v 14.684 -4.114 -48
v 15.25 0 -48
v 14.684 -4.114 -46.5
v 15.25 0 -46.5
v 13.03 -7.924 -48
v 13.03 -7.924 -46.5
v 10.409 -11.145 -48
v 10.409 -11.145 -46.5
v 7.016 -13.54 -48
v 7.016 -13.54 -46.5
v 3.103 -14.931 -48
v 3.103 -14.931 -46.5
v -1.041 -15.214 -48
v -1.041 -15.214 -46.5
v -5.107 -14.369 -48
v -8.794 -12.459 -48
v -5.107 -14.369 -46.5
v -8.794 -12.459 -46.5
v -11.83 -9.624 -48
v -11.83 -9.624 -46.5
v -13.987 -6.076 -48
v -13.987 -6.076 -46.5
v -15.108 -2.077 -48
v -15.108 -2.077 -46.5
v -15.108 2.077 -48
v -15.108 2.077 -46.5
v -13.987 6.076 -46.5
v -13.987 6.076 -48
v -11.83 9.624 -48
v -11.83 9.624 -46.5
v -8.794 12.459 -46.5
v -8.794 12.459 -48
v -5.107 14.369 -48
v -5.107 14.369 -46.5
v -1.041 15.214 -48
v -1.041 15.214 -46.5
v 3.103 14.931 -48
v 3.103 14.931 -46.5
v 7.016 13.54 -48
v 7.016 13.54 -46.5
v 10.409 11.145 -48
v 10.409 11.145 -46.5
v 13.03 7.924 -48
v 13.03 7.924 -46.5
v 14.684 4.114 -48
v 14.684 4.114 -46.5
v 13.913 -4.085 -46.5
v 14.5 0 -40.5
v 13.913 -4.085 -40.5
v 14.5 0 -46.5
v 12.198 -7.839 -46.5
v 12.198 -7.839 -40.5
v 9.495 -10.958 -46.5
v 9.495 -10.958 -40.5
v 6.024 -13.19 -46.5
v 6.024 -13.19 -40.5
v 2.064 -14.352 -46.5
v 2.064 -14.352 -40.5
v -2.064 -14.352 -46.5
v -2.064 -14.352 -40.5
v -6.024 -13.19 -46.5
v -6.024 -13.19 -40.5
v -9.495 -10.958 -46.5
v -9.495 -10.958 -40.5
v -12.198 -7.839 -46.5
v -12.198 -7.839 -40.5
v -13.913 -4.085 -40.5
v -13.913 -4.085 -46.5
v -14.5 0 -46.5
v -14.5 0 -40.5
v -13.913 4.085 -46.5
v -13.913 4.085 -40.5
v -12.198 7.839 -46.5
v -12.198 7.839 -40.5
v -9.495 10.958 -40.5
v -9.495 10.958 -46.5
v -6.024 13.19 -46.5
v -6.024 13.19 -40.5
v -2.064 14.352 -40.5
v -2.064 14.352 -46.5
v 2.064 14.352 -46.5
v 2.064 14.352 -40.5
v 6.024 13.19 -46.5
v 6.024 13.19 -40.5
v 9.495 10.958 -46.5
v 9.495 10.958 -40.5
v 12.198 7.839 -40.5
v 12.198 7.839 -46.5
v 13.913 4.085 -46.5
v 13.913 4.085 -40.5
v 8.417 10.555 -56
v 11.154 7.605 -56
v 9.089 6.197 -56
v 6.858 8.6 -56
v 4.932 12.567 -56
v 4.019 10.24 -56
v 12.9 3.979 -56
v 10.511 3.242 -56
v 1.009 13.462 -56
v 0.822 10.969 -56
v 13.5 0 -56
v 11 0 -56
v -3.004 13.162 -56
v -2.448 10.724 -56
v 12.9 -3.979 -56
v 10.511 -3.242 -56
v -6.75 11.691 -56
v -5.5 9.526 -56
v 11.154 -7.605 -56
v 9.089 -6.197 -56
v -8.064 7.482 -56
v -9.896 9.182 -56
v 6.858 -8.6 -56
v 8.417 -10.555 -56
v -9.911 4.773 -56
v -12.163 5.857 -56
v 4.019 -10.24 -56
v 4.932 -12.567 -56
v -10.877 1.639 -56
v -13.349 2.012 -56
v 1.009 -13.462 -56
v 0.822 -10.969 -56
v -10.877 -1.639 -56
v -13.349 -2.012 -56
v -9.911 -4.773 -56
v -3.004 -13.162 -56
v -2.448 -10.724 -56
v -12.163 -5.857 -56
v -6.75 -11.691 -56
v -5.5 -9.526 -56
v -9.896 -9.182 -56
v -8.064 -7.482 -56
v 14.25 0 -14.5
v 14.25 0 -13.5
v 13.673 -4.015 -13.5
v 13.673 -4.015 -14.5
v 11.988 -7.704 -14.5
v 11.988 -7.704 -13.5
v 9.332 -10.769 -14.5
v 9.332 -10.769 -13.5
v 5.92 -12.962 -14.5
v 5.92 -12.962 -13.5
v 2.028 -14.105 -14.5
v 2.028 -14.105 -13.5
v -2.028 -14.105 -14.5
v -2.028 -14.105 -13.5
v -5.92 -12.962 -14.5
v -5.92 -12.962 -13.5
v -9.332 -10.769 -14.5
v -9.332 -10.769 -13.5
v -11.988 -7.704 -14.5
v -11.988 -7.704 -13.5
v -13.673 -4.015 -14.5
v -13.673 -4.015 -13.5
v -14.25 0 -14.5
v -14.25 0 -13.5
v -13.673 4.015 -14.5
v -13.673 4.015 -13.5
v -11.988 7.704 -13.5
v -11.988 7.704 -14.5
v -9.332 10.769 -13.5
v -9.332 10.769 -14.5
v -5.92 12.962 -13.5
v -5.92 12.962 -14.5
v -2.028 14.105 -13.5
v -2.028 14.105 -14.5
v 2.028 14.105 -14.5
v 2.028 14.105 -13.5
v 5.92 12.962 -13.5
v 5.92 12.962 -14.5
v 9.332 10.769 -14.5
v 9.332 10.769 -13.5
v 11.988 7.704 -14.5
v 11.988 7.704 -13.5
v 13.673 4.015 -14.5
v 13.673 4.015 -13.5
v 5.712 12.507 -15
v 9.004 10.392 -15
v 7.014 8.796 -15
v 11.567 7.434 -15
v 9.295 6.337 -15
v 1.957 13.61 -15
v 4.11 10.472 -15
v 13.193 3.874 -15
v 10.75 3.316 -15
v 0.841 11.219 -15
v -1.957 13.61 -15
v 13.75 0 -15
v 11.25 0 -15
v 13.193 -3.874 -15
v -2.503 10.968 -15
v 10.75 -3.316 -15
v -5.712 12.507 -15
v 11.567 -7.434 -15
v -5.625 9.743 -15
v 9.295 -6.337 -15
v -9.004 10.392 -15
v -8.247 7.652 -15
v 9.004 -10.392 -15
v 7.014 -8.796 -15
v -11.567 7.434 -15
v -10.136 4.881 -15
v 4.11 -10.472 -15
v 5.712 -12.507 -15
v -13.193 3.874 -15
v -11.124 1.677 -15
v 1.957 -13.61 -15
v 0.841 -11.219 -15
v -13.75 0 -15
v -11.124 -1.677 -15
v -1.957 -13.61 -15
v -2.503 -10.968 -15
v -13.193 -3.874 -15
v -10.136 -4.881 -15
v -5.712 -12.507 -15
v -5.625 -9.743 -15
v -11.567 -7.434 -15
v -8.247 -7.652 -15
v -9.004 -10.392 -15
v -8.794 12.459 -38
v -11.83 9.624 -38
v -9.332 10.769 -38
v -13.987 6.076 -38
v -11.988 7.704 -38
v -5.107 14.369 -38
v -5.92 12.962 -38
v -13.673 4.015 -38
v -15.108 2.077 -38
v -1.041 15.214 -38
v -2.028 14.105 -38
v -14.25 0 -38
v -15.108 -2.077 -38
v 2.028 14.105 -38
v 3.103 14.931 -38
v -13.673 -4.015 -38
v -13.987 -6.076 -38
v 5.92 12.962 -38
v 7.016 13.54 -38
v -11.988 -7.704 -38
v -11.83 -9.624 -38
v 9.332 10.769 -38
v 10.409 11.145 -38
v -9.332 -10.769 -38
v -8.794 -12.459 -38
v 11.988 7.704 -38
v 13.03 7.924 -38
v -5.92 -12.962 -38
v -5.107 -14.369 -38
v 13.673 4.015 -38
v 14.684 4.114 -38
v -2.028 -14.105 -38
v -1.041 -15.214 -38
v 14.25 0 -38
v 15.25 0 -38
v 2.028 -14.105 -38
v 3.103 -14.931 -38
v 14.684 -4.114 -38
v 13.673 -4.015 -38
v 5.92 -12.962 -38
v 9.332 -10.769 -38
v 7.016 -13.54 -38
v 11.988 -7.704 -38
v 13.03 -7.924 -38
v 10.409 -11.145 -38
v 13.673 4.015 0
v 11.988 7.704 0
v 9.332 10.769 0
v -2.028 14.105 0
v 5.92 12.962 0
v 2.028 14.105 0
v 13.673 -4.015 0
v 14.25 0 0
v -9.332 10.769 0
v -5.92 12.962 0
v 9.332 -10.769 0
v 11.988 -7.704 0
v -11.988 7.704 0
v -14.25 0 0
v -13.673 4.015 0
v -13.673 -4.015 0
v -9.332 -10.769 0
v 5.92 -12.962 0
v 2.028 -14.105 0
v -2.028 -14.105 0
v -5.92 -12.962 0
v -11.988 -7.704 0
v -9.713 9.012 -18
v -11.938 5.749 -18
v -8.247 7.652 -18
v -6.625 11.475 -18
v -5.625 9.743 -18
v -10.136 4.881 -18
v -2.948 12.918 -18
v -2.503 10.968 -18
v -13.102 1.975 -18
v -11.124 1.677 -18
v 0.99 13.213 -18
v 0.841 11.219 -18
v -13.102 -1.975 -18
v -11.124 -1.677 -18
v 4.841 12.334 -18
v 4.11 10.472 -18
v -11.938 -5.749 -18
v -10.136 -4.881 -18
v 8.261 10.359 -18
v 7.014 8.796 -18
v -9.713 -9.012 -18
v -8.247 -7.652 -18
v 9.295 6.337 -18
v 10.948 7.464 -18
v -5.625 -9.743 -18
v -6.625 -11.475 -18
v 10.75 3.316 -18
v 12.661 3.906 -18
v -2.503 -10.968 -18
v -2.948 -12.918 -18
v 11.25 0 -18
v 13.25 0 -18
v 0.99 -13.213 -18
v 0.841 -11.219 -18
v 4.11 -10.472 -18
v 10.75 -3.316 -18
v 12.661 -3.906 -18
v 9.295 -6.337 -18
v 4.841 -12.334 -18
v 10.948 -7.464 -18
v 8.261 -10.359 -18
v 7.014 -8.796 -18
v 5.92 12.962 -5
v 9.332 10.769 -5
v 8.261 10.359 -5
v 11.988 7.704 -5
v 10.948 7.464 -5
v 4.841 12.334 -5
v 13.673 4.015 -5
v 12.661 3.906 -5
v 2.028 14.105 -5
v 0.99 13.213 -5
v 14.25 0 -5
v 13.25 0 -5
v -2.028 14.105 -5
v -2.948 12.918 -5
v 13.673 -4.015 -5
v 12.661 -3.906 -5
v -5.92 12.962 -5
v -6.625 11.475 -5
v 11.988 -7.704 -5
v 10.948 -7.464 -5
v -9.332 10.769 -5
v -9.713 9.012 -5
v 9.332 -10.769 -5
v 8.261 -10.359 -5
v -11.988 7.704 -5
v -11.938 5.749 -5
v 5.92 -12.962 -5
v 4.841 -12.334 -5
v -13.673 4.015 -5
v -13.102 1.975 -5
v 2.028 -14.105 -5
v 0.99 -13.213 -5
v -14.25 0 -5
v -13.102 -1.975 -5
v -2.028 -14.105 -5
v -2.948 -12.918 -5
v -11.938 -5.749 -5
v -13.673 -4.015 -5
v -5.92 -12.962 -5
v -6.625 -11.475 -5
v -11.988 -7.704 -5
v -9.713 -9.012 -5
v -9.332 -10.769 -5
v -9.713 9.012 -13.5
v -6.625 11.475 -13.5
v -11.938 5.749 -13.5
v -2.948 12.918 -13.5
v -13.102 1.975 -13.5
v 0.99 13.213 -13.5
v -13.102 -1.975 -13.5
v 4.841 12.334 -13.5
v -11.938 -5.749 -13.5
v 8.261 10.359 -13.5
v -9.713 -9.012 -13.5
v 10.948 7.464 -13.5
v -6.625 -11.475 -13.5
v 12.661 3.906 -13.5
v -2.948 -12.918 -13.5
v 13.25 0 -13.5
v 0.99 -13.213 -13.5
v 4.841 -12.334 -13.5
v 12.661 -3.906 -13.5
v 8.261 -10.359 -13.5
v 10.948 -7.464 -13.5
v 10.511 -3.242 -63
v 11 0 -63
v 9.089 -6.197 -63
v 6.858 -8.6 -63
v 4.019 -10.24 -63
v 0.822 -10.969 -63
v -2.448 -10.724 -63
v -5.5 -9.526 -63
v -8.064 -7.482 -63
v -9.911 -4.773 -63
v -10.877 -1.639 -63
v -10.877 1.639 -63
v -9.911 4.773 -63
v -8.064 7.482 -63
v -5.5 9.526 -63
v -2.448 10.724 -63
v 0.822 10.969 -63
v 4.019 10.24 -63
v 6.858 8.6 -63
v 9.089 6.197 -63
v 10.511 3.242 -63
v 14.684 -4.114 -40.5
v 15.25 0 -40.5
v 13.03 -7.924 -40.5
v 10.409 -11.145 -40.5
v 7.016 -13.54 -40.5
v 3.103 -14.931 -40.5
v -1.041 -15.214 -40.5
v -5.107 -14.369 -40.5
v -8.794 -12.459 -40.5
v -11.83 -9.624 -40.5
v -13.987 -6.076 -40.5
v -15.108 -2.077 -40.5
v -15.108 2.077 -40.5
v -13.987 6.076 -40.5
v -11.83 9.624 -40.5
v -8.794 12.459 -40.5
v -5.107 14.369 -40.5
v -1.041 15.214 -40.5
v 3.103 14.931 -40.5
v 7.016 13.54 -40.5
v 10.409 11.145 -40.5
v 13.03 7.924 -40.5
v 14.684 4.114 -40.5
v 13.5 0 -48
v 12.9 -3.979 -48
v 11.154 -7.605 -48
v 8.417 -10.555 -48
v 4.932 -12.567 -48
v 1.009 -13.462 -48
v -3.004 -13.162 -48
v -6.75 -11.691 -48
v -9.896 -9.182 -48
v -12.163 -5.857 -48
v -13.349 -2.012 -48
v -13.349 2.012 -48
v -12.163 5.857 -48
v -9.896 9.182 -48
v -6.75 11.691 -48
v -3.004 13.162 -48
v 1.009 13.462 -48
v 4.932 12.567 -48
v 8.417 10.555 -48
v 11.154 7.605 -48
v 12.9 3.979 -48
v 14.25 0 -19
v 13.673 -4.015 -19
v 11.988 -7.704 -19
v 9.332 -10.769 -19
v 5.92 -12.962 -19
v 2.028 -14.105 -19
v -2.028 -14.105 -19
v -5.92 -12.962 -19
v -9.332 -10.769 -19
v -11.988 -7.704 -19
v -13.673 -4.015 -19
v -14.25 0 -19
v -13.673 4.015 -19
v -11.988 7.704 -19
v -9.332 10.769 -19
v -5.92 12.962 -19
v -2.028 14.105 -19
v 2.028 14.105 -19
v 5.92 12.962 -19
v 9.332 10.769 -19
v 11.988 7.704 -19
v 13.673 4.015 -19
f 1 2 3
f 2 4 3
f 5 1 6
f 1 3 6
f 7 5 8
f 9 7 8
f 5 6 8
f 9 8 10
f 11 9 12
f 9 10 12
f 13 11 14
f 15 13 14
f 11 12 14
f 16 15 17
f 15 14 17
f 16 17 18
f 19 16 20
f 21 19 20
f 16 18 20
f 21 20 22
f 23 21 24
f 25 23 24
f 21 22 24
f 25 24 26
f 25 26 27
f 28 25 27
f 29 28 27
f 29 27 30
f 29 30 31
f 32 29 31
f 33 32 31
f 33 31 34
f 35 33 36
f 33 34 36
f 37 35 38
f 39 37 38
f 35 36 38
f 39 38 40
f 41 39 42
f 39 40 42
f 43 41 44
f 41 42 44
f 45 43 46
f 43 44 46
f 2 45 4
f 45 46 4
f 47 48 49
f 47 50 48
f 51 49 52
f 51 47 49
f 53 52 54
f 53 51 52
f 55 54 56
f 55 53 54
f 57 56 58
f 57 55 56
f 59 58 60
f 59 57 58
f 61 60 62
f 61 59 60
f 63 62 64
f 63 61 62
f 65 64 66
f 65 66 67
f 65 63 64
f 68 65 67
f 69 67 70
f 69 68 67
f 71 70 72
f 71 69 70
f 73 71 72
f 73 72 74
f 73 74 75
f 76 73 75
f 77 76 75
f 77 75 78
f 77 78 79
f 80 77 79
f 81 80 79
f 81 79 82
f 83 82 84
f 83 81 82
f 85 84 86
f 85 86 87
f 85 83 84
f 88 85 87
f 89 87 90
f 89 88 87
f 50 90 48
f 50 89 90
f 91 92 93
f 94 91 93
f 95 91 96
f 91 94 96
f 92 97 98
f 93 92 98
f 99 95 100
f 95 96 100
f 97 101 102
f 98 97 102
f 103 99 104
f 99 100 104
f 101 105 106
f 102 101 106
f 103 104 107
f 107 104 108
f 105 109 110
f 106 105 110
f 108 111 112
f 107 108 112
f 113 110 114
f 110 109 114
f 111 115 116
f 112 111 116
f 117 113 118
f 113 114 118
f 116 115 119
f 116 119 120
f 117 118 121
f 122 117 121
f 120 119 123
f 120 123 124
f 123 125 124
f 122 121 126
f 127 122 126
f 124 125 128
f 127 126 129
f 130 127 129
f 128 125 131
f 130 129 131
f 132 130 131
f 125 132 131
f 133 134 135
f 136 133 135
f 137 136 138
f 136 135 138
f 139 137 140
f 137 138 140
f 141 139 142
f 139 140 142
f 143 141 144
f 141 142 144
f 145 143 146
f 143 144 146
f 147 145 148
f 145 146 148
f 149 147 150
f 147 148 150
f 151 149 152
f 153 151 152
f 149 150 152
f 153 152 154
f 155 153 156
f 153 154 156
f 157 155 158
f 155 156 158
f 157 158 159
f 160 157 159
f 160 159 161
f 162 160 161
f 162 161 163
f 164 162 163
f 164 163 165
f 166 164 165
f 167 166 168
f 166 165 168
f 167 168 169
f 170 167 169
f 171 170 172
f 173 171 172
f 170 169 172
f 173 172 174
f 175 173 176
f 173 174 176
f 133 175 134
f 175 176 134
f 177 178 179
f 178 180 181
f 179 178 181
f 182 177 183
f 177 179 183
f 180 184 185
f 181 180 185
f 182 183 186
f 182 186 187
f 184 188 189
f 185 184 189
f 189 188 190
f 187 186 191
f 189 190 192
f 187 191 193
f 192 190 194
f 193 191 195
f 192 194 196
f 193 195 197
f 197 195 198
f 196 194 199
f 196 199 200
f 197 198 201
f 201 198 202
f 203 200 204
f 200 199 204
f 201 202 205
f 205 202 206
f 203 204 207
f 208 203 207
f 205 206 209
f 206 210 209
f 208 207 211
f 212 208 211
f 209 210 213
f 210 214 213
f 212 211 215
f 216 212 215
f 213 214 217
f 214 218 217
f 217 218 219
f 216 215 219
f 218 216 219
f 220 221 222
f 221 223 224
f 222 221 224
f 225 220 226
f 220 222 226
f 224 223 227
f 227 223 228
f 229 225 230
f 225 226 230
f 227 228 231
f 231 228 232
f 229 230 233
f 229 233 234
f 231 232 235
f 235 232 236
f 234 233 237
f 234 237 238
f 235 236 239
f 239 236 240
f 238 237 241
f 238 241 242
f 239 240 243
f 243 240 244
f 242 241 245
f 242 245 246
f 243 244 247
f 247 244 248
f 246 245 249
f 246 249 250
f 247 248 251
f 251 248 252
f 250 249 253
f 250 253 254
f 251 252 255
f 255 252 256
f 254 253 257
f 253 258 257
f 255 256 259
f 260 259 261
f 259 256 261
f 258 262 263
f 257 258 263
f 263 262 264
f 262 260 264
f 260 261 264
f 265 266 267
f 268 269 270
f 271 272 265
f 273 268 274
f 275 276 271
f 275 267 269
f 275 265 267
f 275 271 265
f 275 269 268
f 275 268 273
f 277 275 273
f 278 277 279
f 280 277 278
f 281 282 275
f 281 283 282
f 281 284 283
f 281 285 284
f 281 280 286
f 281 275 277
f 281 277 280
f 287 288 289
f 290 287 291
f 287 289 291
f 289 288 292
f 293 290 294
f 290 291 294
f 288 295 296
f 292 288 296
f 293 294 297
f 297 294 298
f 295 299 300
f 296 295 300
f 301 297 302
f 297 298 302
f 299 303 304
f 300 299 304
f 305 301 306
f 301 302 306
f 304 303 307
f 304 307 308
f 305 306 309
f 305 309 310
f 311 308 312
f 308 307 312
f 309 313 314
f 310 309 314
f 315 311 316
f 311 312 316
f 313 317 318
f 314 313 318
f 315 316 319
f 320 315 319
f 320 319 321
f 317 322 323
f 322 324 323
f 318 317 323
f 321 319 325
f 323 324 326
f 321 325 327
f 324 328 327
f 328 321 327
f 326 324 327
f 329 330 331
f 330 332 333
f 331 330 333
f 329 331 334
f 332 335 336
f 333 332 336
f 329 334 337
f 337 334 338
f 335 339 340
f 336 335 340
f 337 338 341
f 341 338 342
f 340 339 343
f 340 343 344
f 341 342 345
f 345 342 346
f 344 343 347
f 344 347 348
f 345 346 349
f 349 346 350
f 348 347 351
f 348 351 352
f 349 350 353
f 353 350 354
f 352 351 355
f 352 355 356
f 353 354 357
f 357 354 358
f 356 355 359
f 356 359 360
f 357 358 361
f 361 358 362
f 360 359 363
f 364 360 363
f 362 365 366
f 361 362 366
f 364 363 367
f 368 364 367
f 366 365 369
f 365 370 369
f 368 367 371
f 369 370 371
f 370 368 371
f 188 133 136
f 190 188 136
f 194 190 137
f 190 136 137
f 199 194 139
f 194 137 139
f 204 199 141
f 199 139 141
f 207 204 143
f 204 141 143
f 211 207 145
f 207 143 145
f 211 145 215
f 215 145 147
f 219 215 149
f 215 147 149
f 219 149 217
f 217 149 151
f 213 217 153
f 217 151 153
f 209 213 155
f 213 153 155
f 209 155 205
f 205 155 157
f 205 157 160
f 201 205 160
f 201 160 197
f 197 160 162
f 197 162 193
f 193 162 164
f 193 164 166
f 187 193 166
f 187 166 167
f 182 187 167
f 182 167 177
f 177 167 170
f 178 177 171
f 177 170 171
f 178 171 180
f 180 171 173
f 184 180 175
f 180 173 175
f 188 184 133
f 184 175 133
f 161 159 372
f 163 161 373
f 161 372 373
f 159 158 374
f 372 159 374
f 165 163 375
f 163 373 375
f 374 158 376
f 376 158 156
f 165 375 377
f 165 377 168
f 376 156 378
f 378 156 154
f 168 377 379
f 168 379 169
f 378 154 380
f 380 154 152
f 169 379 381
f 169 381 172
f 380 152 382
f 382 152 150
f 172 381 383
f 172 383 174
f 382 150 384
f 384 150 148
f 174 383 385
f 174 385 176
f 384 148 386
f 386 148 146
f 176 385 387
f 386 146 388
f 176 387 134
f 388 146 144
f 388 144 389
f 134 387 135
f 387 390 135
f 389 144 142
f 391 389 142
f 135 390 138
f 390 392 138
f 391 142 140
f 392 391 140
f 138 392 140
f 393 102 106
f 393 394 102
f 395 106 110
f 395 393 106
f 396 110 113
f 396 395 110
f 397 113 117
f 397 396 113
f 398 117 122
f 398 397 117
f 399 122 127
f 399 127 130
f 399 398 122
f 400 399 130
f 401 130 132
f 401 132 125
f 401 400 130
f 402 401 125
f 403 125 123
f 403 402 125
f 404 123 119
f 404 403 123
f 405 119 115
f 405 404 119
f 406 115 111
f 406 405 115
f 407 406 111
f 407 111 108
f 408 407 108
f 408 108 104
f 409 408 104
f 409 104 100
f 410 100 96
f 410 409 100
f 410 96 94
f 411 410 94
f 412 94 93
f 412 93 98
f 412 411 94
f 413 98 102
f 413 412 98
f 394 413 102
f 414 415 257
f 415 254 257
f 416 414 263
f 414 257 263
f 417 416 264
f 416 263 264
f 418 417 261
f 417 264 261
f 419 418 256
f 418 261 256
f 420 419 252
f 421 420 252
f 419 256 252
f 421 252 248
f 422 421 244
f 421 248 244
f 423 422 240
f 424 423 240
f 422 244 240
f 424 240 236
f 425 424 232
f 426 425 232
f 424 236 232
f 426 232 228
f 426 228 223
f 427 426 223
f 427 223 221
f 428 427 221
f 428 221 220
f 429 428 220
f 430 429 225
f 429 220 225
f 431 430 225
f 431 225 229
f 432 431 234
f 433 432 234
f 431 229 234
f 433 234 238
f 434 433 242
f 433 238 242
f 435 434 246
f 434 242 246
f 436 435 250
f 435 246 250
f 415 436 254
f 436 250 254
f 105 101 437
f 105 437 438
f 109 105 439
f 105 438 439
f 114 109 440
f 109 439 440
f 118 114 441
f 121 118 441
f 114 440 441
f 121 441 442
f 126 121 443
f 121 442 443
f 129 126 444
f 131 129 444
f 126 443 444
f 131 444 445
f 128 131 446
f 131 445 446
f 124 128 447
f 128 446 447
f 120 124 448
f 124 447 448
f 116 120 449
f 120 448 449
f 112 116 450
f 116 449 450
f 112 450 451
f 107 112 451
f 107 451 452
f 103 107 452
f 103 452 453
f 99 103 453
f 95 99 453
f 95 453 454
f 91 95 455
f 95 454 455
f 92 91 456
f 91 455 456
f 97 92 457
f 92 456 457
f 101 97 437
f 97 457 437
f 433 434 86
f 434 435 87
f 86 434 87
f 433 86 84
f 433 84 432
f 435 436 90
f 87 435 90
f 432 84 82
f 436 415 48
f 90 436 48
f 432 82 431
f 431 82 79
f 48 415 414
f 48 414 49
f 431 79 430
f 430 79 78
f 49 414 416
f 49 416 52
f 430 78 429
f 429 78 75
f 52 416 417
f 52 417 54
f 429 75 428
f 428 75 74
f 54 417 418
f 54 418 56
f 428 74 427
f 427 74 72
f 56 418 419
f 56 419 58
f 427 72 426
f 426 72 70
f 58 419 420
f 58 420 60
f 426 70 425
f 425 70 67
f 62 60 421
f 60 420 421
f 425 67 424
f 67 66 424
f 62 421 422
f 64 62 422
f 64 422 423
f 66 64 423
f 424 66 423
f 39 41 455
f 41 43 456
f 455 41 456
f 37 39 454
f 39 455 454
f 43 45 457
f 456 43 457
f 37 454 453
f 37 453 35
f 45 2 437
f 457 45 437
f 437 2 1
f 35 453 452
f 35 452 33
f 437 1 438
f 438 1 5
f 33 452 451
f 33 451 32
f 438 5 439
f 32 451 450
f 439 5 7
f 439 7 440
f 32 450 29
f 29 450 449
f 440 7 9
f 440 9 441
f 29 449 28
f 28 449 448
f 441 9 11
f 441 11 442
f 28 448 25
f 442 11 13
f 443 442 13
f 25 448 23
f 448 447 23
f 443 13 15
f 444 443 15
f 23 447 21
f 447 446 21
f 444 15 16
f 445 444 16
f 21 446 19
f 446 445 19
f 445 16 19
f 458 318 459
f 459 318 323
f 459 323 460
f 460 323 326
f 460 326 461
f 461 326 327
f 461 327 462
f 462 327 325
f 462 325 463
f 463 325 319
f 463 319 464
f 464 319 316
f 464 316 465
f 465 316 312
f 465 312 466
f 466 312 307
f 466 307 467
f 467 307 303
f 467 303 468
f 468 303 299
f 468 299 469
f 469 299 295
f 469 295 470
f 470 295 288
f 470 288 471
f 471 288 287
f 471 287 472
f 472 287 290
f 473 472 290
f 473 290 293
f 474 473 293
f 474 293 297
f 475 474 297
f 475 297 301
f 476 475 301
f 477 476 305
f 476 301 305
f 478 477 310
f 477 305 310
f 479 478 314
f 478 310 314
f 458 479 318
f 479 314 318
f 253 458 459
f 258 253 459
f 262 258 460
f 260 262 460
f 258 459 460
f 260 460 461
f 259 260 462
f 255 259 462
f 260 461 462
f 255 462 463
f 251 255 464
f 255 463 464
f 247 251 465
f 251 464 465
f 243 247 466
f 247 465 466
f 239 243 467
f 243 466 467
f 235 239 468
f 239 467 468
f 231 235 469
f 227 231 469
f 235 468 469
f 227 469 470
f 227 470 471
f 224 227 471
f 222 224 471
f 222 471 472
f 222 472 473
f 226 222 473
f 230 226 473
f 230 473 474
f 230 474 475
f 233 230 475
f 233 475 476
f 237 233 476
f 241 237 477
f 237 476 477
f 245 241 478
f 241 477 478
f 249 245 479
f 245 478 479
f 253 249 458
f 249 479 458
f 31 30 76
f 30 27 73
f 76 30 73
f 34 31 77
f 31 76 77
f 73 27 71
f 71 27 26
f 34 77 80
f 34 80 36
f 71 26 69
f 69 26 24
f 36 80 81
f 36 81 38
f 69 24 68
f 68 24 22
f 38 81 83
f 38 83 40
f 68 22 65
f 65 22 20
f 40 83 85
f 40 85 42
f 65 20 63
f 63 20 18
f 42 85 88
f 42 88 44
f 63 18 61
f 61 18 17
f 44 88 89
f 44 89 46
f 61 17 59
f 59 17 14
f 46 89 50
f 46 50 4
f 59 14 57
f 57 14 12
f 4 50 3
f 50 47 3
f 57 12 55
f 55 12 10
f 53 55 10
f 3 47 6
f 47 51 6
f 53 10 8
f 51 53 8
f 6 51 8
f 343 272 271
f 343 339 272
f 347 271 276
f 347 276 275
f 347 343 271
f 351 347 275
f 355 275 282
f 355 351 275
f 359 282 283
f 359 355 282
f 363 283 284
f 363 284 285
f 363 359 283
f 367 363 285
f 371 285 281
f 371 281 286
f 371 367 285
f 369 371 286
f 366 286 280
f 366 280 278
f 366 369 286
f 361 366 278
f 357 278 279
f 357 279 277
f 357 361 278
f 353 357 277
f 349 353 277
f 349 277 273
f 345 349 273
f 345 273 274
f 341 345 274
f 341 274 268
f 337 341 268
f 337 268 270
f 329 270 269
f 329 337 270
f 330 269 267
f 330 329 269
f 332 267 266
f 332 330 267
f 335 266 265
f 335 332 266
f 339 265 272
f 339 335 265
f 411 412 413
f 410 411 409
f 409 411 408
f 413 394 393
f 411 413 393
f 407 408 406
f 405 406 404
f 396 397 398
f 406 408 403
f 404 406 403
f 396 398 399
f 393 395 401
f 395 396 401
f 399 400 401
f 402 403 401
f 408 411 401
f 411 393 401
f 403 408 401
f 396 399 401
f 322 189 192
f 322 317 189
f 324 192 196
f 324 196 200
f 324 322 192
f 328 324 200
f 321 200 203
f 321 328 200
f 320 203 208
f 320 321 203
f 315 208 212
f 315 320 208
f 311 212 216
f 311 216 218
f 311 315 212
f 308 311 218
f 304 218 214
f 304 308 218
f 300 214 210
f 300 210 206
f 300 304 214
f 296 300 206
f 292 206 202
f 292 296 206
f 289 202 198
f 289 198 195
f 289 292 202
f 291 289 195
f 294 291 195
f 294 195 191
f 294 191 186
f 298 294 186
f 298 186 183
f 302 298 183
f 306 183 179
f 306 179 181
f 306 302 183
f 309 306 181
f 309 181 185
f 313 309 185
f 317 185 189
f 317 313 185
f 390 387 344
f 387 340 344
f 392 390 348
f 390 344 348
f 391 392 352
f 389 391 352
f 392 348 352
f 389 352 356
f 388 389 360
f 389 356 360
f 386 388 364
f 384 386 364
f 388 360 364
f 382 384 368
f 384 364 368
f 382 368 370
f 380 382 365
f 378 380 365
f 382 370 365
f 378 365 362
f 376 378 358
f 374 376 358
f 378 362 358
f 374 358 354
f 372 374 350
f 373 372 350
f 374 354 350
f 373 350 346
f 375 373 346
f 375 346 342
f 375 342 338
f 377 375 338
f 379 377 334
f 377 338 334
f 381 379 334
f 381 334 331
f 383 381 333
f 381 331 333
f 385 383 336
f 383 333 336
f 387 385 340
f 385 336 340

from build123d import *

# Parameters (mm, degrees)
SKETCH1_W     = 5
SKETCH1_H     = 14.25
SKETCH1_W_2   = 3
SKETCH1_H_2   = 11.25
SKETCH1_W_3   = 6
SKETCH1_H_3   = 14.5
SKETCH1_W_4   = 7
SKETCH1_H_4   = 11
CHAMFER1_SIZE = 1
CHAMFER2_SIZE = 0.5


with BuildPart() as part:
    # Sketch1 → Revolve1 (revolve)
    with BuildSketch(Plane(origin=(0, 0, 0), x_dir=(0, 0, -1), z_dir=(1, 0, 0)), mode=Mode.PRIVATE) as revolve1_sk:
        with Locations((2.5, 7.125)):
            Rectangle(SKETCH1_W, SKETCH1_H)
        Polygon((5, 13.25), (5, 0), (13.5, 0), (13.5, 11.25), (13.5, 13.25), align=None)
        Polygon((13.5, 11.25), (13.5, 0), (15, 0), (15, 11.25), (15, 14.25), (13.5, 14.25), (13.5, 13.25), align=None)
        with Locations((16.5, 5.625)):
            Rectangle(SKETCH1_W_2, SKETCH1_H_2)
        Polygon((18, 11.25), (18, 0), (38, 0), (38, 14.25), (18, 14.25), align=None)
        Polygon((38, 14.25), (38, 0), (40.5, 0), (40.5, 14.5), (40.5, 15.25), (38, 15.25), align=None)
        with Locations((43.5, 7.25)):
            Rectangle(SKETCH1_W_3, SKETCH1_H_3)
        Polygon((46.5, 14.5), (46.5, 0), (48, 0), (48, 13.5), (48, 15.25), (46.5, 15.25), align=None)
        Polygon((48, 13.5), (48, 0), (56, 0), (56, 11), (56, 13.5), align=None)
        with Locations((59.5, 5.5)):
            Rectangle(SKETCH1_W_4, SKETCH1_H_4)
    revolve(revolve1_sk.sketch.rotate(Axis((0, 0, -5), (0, 0, -1)), 90), axis=Axis((0, 0, -5), (0, 0, -1)))

    # Chamfer1
    chamfer1_edges = [part.edges().sort_by_distance(p)[0] for p in [
        (-14.25, 0, -18),
    ]]
    chamfer(chamfer1_edges, length=CHAMFER1_SIZE)

    # Chamfer2
    chamfer2_edges = [part.edges().sort_by_distance(p)[0] for p in [
        (-14.25, 0, -15),
    ]]
    chamfer(chamfer2_edges, length=CHAMFER2_SIZE)


solid = part.part
